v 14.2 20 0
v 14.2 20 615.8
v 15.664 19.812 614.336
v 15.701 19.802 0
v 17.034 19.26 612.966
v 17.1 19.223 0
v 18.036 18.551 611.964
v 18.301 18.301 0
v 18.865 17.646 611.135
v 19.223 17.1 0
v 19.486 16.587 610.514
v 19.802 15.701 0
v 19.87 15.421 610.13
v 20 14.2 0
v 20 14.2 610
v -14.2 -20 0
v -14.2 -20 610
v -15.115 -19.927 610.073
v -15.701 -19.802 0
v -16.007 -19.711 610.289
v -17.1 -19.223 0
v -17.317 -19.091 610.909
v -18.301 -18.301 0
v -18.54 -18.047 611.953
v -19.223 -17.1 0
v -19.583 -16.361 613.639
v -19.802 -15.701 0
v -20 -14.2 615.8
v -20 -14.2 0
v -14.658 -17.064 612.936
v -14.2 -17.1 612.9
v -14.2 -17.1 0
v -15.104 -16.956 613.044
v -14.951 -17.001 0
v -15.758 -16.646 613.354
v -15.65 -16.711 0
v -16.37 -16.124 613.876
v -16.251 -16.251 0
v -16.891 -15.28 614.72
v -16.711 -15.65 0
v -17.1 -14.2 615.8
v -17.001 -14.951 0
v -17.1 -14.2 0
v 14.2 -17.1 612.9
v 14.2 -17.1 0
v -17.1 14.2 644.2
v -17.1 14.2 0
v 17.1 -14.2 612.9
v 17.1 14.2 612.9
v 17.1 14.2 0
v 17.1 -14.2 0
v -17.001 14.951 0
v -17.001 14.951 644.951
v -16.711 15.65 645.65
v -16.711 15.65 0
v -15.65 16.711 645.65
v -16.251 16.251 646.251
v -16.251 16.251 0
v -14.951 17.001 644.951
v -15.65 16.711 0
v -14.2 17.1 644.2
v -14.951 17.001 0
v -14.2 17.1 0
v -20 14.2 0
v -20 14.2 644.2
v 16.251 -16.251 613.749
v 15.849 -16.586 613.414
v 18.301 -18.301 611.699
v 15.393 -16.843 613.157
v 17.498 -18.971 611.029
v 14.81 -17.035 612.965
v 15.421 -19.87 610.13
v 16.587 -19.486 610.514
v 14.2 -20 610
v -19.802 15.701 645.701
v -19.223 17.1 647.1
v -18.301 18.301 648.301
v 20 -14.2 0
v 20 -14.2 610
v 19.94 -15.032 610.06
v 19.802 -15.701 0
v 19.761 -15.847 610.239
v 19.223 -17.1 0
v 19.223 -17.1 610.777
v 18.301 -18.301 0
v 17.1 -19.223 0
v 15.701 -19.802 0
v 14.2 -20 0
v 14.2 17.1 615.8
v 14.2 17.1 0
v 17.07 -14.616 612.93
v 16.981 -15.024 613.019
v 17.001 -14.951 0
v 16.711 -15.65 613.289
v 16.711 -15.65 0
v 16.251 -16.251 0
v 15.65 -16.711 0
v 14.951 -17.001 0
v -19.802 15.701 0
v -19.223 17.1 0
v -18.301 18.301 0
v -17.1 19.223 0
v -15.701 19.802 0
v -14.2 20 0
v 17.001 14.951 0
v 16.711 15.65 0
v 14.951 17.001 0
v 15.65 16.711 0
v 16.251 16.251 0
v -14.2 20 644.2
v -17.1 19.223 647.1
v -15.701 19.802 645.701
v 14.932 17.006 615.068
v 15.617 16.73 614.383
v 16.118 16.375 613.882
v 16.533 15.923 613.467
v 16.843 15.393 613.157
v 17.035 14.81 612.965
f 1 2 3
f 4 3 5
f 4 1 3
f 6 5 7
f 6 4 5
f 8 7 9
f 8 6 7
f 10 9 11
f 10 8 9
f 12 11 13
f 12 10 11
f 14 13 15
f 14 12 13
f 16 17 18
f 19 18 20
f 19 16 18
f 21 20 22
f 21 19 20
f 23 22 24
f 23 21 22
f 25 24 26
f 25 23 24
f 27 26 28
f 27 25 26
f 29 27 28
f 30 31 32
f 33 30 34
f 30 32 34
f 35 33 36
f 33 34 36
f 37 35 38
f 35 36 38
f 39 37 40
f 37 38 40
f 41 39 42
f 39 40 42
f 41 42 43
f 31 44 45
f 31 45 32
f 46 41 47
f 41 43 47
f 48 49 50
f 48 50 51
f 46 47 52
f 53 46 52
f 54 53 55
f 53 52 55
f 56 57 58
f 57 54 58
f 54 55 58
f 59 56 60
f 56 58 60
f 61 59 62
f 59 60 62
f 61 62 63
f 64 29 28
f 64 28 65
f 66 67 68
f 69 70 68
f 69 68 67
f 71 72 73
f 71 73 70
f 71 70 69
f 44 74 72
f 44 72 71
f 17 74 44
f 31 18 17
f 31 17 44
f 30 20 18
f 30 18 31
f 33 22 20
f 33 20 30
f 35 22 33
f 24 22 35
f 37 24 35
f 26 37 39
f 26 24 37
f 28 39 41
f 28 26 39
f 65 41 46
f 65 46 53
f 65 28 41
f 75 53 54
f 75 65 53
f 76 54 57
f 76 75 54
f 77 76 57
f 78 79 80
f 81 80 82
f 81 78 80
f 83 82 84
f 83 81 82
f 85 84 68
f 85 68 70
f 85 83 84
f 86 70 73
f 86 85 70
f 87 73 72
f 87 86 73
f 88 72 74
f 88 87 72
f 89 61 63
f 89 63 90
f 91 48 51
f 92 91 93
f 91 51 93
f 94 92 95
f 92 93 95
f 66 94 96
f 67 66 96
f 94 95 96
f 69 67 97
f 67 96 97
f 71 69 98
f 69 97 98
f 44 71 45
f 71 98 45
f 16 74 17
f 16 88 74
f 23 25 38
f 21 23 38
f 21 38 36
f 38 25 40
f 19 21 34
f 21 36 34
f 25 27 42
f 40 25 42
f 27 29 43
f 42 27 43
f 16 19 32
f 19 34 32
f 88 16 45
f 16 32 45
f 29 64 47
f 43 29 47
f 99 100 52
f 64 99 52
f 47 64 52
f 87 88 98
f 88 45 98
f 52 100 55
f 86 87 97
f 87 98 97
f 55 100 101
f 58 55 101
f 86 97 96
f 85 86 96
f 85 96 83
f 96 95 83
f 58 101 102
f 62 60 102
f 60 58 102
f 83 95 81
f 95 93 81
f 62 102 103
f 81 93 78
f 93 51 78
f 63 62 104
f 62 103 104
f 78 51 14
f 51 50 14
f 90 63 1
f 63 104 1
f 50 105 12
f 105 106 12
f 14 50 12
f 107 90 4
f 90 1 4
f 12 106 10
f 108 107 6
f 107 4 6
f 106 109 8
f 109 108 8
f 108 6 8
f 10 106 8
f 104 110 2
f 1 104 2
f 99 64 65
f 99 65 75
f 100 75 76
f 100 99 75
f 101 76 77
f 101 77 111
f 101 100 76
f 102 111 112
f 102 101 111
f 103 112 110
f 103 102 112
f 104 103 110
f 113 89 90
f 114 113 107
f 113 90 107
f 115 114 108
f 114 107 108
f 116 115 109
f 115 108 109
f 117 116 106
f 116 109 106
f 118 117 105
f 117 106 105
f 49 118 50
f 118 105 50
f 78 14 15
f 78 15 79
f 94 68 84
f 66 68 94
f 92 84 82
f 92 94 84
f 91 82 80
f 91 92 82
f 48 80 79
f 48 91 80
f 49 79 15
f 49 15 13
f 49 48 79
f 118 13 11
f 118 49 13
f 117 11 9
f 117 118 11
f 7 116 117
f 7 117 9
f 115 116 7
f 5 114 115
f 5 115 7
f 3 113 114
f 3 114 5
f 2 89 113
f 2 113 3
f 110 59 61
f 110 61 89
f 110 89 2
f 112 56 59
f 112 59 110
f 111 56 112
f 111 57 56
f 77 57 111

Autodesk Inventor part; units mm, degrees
ref_plane "Plano inicial" through (0, 0, 0) normal (0, 0, 1) x (1, 0, 0)
ref_plane "Plano final" through (0, 0, 648.3012) normal (0, 0, 1) x (1, 0, 0)
sketch "Boceto" plane through (0, 0, 0) normal (0, 0, 1) x (1, 0, 0)
  line L0 (-14.2, 20) -> (14.2, 20)
  line L1 (20, 14.2) -> (20, -14.2)
  line L2 (14.2, -20) -> (-14.2, -20)
  line L3 (-20, -14.2) -> (-20, 14.2)
  arc A0 (-14.2, 20) -> (-20, 14.2) centre (-14.2, 14.2) ccw
  arc A1 (20, 14.2) -> (14.2, 20) centre (14.2, 14.2) ccw
  arc A2 (14.2, -20) -> (20, -14.2) centre (14.2, -14.2) ccw
  arc A3 (-20, -14.2) -> (-14.2, -20) centre (-14.2, -14.2) ccw
  line L4 (-29.6817, 0) -> (29.6817, 0) construction
  line L5 (0, -29.6817) -> (0, 29.6817) construction
  arc A4 (-14.2, 17.1) -> (-17.1, 14.2) centre (-14.2, 14.2) ccw
  line L6 (-14.2, 17.1) -> (14.2, 17.1)
  arc A5 (17.1, 14.2) -> (14.2, 17.1) centre (14.2, 14.2) ccw
  line L7 (17.1, 14.2) -> (17.1, -14.2)
  arc A6 (14.2, -17.1) -> (17.1, -14.2) centre (14.2, -14.2) ccw
  line L8 (14.2, -17.1) -> (-14.2, -17.1)
  arc A7 (-17.1, -14.2) -> (-14.2, -17.1) centre (-14.2, -14.2) ccw
  line L9 (-17.1, -14.2) -> (-17.1, 14.2)
  point P0 (-20, 20)
  point P1 (20, -20)
  point P2 (20, 20)
  dimension "b" = 40
  dimension "msp_r" = 5.8
  dimension "d8" = 20
  dimension "d9" = 20
  dimension "d10" = 2.9
extrude "Cuerpo" add sketch "Boceto" along normal up to surface (648.3012 mm away) from surface at 0
sketch "Sketch2" plane through (0, 0, 0) normal (0, 0, 1) x (1, 0, 0)
  line L0 (0, 0) -> (10, 0)
ref_plane "Work Plane3" through (0, 0, 0) normal (0, -1, 0) x (1, 0, 0)
sketch "Sketch3" plane through (0, 0, 0) normal (0, -1, 0) x (1, 0, 0)
  line L0 (-2, 0) -> (12, 0)
  line L1 (-2, 648.3012) -> (12, 648.3012)
  dimension "d14" = 648.3012
ref_plane "Plano de trabajo4" through (0, 20, 650) normal (0, -0.7071, 0.7071) x (1, 0, 0)
split "Dividir1" plane through (0, 20, 650) removes the side toward (0, -0.7071, 0.7071)
ref_plane "Plano de trabajo5" through (-20, 0, 650) normal (0.7071, 0, 0.7071) x (0.7071, 0, -0.7071)
split "Dividir2" plane through (-20, 0, 650) removes the side toward (0.7071, 0, 0.7071)
equation "\"msp_r\" = 2 * ParT"
equation "\"d8\" = d9"
equation "\"d9\" = 0.5 * b"
equation "\"d10\" = ParT"
equation "\"G_OFFSET_START\" = 0"
equation "\"G_OFFSET_END\" = 18.30122"
equation "\"d12\" = G_OFFSET_END + B_L"
equation "\"G_L\" = d14"
equation "\"ParT\" = 2.9"
equation "\"B_L\" = 630"
properties part number "DIN 59 410 - 40x40x2.9-648.301" material "Acero, suave"
